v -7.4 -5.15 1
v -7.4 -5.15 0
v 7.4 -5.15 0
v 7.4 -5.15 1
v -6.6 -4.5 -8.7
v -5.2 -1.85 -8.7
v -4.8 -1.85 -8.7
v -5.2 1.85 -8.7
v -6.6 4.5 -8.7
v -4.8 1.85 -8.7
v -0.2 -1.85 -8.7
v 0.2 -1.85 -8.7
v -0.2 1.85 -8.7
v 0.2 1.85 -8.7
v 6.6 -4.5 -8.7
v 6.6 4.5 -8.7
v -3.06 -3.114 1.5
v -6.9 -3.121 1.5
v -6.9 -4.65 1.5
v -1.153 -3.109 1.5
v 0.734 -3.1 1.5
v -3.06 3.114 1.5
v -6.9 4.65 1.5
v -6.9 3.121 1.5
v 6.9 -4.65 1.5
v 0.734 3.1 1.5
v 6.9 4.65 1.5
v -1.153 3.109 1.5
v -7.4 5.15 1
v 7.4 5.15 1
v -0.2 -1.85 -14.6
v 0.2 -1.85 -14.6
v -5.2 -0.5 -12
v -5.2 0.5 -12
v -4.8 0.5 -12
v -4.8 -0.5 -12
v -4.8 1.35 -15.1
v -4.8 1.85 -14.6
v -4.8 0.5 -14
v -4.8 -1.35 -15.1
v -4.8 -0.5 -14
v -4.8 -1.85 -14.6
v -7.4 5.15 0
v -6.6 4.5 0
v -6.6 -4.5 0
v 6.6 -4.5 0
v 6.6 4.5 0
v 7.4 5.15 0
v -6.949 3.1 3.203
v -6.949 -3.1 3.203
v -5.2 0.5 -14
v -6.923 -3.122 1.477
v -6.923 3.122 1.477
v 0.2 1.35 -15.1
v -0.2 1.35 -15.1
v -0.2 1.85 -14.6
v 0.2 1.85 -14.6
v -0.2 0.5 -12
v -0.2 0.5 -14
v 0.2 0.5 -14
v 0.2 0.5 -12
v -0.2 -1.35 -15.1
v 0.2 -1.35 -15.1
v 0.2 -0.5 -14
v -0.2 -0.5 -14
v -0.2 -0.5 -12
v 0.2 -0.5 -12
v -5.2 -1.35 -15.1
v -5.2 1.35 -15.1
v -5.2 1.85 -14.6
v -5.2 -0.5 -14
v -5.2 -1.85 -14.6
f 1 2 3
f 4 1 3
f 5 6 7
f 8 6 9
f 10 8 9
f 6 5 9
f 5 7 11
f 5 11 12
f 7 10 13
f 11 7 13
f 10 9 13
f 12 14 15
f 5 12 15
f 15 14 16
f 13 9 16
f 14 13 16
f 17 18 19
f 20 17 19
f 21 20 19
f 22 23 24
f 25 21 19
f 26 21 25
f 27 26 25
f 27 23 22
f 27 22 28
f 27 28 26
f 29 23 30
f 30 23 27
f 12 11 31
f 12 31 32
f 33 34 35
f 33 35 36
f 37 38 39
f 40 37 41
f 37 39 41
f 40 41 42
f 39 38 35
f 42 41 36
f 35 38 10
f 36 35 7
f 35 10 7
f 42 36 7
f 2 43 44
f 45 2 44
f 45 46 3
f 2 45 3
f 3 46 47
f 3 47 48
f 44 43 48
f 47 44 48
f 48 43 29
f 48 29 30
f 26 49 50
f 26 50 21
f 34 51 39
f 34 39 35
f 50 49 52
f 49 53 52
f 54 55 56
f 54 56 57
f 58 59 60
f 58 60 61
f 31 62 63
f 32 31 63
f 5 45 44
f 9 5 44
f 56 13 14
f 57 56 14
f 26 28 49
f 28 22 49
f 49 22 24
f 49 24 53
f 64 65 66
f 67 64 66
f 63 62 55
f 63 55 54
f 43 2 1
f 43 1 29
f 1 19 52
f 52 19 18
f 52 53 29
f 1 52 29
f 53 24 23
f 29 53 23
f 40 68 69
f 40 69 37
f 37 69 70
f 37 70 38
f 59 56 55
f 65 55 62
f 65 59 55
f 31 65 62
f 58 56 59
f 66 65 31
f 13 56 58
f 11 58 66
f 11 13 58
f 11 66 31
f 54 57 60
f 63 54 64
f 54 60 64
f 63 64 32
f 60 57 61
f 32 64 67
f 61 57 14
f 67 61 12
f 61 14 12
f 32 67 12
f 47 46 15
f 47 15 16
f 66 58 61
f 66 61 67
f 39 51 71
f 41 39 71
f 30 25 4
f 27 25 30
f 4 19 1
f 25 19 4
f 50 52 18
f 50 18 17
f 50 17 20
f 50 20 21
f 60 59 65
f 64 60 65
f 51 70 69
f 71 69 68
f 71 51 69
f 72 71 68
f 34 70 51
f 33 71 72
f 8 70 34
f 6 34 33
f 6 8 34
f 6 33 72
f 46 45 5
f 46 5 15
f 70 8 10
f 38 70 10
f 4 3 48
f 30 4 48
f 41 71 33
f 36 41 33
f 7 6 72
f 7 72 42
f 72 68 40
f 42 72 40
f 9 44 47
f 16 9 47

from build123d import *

# Parameters (mm, degrees)
SKETCH_W        = 14.8
SKETCH_H        = 10.3
PAD_DEPTH       = 1.5
CHAMFER_SIZE    = 0.5
SKETCH002_W     = 13.8
SKETCH002_H     = 6.2
SKETCH001_W     = 13.8
SKETCH001_H     = 6.28
SKETCH003_W     = 13.2
SKETCH003_H     = 9
PAD001_DEPTH    = 8.7
SKETCH004_W     = 0.4
SKETCH004_H     = 3.7
PAD002_DEPTH    = 6.4
SKETCH005_W     = 1
SKETCH005_H     = 2
POCKET_DEPTH    = 12.601
CHAMFER001_SIZE = 0.5


with BuildPart() as part:
    # Sketch → Pad (new body)
    with BuildSketch(Plane.XY):
        Rectangle(SKETCH_W, SKETCH_H)
    extrude(amount=PAD_DEPTH)

    # Chamfer
    chamfer_edges = [part.edges().sort_by_distance(p)[0] for p in [
        (0, 5.15, 1.5),
        (7.4, 0, 1.5),
        (0, -5.15, 1.5),
        (-7.4, 0, 1.5),
    ]]
    chamfer(chamfer_edges, length=CHAMFER_SIZE)

    # Sketch002 (on DatumPlane) → AdditiveLoft section 0
    with BuildSketch(Plane(origin=(6.523704, 0, 0.21644), x_dir=(0.976296, 0, -0.21644), z_dir=(0.21644, 0, 0.976296))):
        with Locations((-6.9, 0)):
            Rectangle(SKETCH002_W, SKETCH002_H)
    # Sketch001 → AdditiveLoft section 1
    with BuildSketch(Plane.XY):
        Rectangle(SKETCH001_W, SKETCH001_H)
    loft()

    # Sketch003 → Pad001 (join)
    with BuildSketch(Plane.XY):
        Rectangle(SKETCH003_W, SKETCH003_H)
    extrude(amount=-PAD001_DEPTH)

    # Sketch004 (on DatumPlane) → Pad002 (join)
    with BuildSketch(Plane(origin=(0, 0, -8.7), x_dir=(1, 0, 0), z_dir=(0, 0, -1))):
        with Locations((-5, 0)):
            Rectangle(SKETCH004_W, SKETCH004_H)
        Rectangle(SKETCH004_W, SKETCH004_H)
    extrude(amount=PAD002_DEPTH)

    # Sketch005 (on DatumPlane) → Pocket (cut, through all)
    with BuildSketch(Plane(origin=(-5.2, 0, 0), x_dir=(0, -1, 0), z_dir=(-1, 0, 0))):
        with Locations((0, -13)):
            Rectangle(SKETCH005_W, SKETCH005_H)
    extrude(amount=-POCKET_DEPTH, mode=Mode.SUBTRACT)

    # Chamfer001
    chamfer001_edges = [part.edges().sort_by_distance(p)[0] for p in [
        (-5, -1.85, -15.1),
        (0, -1.85, -15.1),
        (0, 1.85, -15.1),
        (-5, 1.85, -15.1),
    ]]
    chamfer(chamfer001_edges, length=CHAMFER001_SIZE)


solid = part.part
